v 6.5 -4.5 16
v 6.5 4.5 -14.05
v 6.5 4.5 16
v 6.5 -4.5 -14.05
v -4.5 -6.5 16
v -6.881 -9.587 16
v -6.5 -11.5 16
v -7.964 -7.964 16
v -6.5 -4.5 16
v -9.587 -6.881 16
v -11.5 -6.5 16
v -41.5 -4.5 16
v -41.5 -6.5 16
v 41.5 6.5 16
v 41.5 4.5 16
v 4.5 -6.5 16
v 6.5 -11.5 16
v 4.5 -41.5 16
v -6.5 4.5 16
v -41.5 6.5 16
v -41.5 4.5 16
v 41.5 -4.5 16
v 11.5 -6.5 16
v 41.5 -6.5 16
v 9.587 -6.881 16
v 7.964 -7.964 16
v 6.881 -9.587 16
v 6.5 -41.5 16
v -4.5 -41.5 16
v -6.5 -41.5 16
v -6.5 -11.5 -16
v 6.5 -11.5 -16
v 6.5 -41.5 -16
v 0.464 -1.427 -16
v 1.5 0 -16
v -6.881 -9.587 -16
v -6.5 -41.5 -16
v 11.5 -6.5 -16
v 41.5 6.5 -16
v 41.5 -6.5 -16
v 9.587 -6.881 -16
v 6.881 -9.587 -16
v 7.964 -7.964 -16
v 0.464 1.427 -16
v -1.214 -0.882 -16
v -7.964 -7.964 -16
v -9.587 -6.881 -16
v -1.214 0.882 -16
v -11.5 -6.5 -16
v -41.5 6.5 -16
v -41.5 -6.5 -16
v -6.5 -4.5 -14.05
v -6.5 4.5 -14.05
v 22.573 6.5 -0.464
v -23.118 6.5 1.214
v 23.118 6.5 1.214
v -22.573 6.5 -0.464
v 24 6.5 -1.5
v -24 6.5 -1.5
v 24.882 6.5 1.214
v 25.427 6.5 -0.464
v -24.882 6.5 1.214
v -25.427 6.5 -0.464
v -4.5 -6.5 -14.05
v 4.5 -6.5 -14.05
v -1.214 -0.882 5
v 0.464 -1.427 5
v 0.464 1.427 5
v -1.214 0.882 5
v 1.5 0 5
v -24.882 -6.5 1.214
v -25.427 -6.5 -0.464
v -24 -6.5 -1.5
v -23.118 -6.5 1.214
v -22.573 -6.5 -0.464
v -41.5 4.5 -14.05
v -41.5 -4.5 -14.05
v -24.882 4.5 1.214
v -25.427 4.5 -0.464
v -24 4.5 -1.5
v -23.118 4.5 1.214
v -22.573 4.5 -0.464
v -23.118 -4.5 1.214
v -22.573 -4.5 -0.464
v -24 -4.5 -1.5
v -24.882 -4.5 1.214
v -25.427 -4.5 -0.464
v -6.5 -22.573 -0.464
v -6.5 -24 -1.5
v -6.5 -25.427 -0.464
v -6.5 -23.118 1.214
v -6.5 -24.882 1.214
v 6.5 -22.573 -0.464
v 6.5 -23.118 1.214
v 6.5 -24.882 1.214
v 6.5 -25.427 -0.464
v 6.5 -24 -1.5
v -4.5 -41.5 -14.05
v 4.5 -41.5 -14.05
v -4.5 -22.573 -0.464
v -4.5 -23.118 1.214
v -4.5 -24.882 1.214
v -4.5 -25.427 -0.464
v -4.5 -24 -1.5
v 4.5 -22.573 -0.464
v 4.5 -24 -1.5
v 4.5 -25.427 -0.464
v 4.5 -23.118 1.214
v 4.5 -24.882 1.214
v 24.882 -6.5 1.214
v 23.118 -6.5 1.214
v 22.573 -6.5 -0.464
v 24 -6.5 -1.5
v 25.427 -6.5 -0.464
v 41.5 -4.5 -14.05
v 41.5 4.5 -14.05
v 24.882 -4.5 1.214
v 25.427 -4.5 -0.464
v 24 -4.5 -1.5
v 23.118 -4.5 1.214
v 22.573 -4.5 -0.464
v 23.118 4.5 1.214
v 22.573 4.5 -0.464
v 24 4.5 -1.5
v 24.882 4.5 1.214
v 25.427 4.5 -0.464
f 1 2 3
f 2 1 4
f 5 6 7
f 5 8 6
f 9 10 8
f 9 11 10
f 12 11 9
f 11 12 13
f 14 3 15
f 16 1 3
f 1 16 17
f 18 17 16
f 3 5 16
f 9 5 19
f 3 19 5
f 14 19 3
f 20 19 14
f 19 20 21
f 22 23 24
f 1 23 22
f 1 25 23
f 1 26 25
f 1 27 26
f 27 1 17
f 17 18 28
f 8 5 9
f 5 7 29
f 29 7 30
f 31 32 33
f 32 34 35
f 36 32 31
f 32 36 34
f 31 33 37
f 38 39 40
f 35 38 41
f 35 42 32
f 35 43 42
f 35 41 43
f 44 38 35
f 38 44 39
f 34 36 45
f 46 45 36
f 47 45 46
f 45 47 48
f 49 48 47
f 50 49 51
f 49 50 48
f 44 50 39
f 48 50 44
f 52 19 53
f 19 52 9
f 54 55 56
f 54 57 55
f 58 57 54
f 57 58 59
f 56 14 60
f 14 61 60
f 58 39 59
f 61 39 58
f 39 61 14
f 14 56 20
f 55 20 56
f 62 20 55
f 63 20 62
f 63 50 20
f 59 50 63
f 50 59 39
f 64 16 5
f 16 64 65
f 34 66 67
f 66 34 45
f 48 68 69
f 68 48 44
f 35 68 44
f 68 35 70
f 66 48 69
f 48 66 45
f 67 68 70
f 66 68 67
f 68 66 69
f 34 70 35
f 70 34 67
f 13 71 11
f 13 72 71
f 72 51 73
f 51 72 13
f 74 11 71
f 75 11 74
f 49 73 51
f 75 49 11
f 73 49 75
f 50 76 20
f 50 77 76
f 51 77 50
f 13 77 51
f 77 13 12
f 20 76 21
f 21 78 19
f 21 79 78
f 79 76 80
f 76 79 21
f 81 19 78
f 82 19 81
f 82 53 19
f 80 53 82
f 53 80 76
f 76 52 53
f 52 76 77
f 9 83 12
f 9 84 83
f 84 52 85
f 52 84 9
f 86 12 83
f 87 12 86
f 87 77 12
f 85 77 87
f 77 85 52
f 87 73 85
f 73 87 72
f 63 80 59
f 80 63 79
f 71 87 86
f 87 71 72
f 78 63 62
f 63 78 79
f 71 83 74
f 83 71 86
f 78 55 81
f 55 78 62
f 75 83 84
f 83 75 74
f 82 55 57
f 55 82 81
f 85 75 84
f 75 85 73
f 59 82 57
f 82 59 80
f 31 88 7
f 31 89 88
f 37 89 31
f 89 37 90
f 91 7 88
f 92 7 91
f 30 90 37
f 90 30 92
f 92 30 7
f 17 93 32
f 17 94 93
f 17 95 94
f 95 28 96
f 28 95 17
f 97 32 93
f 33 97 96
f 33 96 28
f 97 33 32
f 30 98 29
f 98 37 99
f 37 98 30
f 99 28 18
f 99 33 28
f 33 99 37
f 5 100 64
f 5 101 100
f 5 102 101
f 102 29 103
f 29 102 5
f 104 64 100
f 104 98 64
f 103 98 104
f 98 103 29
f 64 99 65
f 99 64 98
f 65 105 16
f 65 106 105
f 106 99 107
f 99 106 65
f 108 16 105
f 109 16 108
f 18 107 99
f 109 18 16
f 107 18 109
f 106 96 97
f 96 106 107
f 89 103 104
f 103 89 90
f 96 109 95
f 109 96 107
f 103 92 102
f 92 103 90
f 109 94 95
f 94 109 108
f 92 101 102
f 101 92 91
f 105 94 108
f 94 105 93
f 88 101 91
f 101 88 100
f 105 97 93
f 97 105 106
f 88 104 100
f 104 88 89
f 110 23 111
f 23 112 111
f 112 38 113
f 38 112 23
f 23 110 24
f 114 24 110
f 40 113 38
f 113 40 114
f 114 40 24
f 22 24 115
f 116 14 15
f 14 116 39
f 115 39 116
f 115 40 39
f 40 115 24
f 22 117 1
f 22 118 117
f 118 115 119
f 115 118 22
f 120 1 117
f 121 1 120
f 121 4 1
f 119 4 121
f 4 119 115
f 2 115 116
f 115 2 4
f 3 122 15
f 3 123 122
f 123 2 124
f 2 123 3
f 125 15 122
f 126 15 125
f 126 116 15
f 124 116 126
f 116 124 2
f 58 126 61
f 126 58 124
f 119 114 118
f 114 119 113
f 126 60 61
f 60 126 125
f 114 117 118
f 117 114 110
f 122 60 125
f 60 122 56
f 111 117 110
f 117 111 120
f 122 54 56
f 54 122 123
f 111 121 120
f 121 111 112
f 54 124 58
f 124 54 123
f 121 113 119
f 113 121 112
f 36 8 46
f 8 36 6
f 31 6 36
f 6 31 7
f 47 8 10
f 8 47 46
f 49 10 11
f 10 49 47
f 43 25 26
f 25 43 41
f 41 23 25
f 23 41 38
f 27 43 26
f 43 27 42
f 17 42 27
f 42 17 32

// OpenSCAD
/* [Basics] */
//how many boards do you want to connect? (default: 1-4; experimental)
connectors_amount = 3;
//angle between connectors..(default: 90; experimental)
connectors_angle = 90;
//enter the thickness of your boards (0 for shell only, which would then be double..)
board_thickness = 9;
//how long should the cutout for the board be?
notch_lenght = 35;
//depth of the cutout
notch_depth = 30;
//thickness of the walls
shell_thickness = 2;
//inner edges fillet (0 for none, default: 7; experimental)
edges_fillet = 7; //[0:10]
/* [Bottom Part] */
//false, if no foot is required
its_a_bottom_part = "false"; //[true, false]
//false, if the 1-connector-bottom-parts slot should face to the side
straight_1_connector_bottom = "false"; //[true, false]
//how thick should the foot be?
ground_offset = 16;
//what width should the foot have? (default: 30; experimental)
foot_width = 30; //[0:100]
ground_surface = ((notch_lenght + shell_thickness) * 2 + board_thickness)* foot_width / 100;
/* [Holes] */
//true, if there should be holes in the middle of the slotpartkindofthing
insert_hole_for_board = "true"; //[true, false]
//diameter of the hole
board_hole_size = 3;
//true, if there is shold be a hole for screws for some diagonal braces
insert_hole_for_brace = "true"; //[true, false]
//size of said holes
brace_hole_size = 3;
//depth of said holes
brace_hole_depth = 20; 
/* [Panels] */
//amount of back parts (default: 0-4, experimental)
back_parts_amount = 0; //[0:4]
//size of holes (default: 3)
back_part_hole_size = 3;
/* [Edge] */
// polynomial that goes through (1,1), (2,1), (3,2), (4,3) for number of spaces between rectangular notches
    //y(x) = pow(x, 2) / 2 - 3 * x / 2 + 2    
spaces = (pow(connectors_amount, 2) / 2) - (3 * connectors_amount / 2) + 2;

module centerpiece(){
        if((connectors_amount < 5) && (connectors_angle == 90)){
                cube([board_thickness + shell_thickness * 2, board_thickness + (shell_thickness*2), notch_depth + shell_thickness], center = true);}    
        else{
            cylinder(h = notch_depth + shell_thickness, r = board_thickness + shell_thickness, center = true);
        }
}

module brace_hole(){
    if (insert_hole_for_brace == "true"){
        difference(){
            centerpiece();
            translate([0, 0, - notch_depth / 2 - 1]) cylinder (h = brace_hole_depth + 1, r = brace_hole_size / 2, center = false, $fn=brace_hole_size + 2);
        }
    } else{
        centerpiece();
    }
}

module ground_piece(){
    if (its_a_bottom_part == "true" && connectors_amount < 4){
        translate([0, (ground_offset + board_thickness) / 2 + shell_thickness, 0])
        cube([ground_surface, ground_offset, notch_depth + shell_thickness], center = true);
    }
}
                    
module notch(){
    difference(){
        //centerpiece();
        translate([0, (notch_lenght + board_thickness) / 2 + shell_thickness, 0])
            cube([board_thickness + shell_thickness * 2, notch_lenght + shell_thickness*0, notch_depth + shell_thickness], center = true);
        translate([0, notch_lenght / 2 + board_thickness, shell_thickness / 2 + 1])
            cube([board_thickness, notch_lenght * 2, notch_depth + shell_thickness + 0.1], center = true);
    }
}


module board_hole(){
    if (insert_hole_for_board == "true"){
        difference(){
            notch();
            translate([0, (notch_lenght + board_thickness + 2 * shell_thickness) / 2, 0])
            rotate([0,90,0]) cylinder(h=board_thickness + 2 * shell_thickness + 0.1, r = board_hole_size / 2, center = true);}
}
else{
    notch();}
}

module rounded_corner(){
    difference(){
    translate([-(board_thickness + 2 * shell_thickness + notch_lenght / edges_fillet) / 2,-(board_thickness + 2 * shell_thickness + notch_lenght / edges_fillet) / 2, 0]) 
        cube([notch_lenght / edges_fillet, notch_lenght / edges_fillet, notch_depth+shell_thickness], center = true);
    translate([-(board_thickness + 2 * shell_thickness + 2* notch_lenght / edges_fillet)/2,-(board_thickness + 2 * shell_thickness + 2*notch_lenght / edges_fillet) / 2, 0])  
        cylinder(h = notch_depth+shell_thickness+0.1, r = notch_lenght/edges_fillet, center = true);;}
    
}

module main(){
    union(){
    brace_hole(); 
    for (i = [1 : connectors_amount]){
        rotate([0, 0, connectors_angle * i]) board_hole();}
    if (connectors_amount > 1 && connectors_amount < 8 && connectors_angle == 90){
        
        for (i = [1 : pow(2, connectors_amount - 2)]){
            rotate([0, 0, (i - 1) * connectors_angle]) rounded_corner();
        }
    }
    if (its_a_bottom_part == "true" && (connectors_amount == 1)){
        if (straight_1_connector_bottom == "false" && its_a_bottom_part == "true"){
        translate([(board_thickness + 2 * shell_thickness - ground_surface) / 2, 0, 0]) ground_piece();}    
        else{
            translate([(ground_offset + board_thickness) / 2 + shell_thickness, 0, 0]) cube([ground_offset, board_thickness + 2 * shell_thickness, notch_depth + shell_thickness], center = true);}
    }
    if (its_a_bottom_part && (connectors_amount == 2)){
    translate([(board_thickness + 2 * shell_thickness - ground_surface) / 2, 0, 0]) ground_piece();}
    if (its_a_bottom_part && (connectors_amount == 3)){
        ground_piece();}
    }
}

module add_back_notch(){
    if (back_parts_amount > 0){
        difference(){
            union(){
                main();
                for (i = [1 : back_parts_amount]){
                    rotate([0, 0, (i - 1) * connectors_angle])
                    translate([-(board_thickness + shell_thickness * 2 + notch_lenght) / 2, -(notch_lenght + board_thickness + 2 * shell_thickness) / 2,-(notch_depth - board_thickness - shell_thickness) / 2])
                    cube([notch_lenght, notch_lenght, board_thickness + 2 * shell_thickness], center = true);
                }
            }
            for (i = [1 : back_parts_amount]){
                rotate([0, 0, (i-1) * connectors_angle])
                translate([-(board_thickness + shell_thickness * 2 + notch_lenght) / 2 - 1, -(notch_lenght + board_thickness + 2 * shell_thickness) / 2-1,-(notch_depth - board_thickness - shell_thickness) / 2])
                cube([notch_lenght+2, notch_lenght+2, board_thickness], center = true);
                rotate([0, 0, (i-1) * connectors_angle])
                translate([-(board_thickness + shell_thickness * 2 + notch_lenght) / 2, -(notch_lenght + board_thickness + 2 * shell_thickness) / 2,-(notch_depth - board_thickness - shell_thickness) / 2])
                cylinder(h = board_thickness + 2 * shell_thickness + 0.1, r = back_part_hole_size / 2, center = true);
            }
            
        }
}else{
    main();
}
}
//    rotate([0, -90, 90]) translate([-(notch_depth - board_thickness - shell_thickness * 2 + shell_thickness) / 2, 0, (board_thickness + notch_depth + shell_thickness)/2+shell_thickness]) board_hole();


add_back_notch();

//TODO: center board hole
//TODO: 
